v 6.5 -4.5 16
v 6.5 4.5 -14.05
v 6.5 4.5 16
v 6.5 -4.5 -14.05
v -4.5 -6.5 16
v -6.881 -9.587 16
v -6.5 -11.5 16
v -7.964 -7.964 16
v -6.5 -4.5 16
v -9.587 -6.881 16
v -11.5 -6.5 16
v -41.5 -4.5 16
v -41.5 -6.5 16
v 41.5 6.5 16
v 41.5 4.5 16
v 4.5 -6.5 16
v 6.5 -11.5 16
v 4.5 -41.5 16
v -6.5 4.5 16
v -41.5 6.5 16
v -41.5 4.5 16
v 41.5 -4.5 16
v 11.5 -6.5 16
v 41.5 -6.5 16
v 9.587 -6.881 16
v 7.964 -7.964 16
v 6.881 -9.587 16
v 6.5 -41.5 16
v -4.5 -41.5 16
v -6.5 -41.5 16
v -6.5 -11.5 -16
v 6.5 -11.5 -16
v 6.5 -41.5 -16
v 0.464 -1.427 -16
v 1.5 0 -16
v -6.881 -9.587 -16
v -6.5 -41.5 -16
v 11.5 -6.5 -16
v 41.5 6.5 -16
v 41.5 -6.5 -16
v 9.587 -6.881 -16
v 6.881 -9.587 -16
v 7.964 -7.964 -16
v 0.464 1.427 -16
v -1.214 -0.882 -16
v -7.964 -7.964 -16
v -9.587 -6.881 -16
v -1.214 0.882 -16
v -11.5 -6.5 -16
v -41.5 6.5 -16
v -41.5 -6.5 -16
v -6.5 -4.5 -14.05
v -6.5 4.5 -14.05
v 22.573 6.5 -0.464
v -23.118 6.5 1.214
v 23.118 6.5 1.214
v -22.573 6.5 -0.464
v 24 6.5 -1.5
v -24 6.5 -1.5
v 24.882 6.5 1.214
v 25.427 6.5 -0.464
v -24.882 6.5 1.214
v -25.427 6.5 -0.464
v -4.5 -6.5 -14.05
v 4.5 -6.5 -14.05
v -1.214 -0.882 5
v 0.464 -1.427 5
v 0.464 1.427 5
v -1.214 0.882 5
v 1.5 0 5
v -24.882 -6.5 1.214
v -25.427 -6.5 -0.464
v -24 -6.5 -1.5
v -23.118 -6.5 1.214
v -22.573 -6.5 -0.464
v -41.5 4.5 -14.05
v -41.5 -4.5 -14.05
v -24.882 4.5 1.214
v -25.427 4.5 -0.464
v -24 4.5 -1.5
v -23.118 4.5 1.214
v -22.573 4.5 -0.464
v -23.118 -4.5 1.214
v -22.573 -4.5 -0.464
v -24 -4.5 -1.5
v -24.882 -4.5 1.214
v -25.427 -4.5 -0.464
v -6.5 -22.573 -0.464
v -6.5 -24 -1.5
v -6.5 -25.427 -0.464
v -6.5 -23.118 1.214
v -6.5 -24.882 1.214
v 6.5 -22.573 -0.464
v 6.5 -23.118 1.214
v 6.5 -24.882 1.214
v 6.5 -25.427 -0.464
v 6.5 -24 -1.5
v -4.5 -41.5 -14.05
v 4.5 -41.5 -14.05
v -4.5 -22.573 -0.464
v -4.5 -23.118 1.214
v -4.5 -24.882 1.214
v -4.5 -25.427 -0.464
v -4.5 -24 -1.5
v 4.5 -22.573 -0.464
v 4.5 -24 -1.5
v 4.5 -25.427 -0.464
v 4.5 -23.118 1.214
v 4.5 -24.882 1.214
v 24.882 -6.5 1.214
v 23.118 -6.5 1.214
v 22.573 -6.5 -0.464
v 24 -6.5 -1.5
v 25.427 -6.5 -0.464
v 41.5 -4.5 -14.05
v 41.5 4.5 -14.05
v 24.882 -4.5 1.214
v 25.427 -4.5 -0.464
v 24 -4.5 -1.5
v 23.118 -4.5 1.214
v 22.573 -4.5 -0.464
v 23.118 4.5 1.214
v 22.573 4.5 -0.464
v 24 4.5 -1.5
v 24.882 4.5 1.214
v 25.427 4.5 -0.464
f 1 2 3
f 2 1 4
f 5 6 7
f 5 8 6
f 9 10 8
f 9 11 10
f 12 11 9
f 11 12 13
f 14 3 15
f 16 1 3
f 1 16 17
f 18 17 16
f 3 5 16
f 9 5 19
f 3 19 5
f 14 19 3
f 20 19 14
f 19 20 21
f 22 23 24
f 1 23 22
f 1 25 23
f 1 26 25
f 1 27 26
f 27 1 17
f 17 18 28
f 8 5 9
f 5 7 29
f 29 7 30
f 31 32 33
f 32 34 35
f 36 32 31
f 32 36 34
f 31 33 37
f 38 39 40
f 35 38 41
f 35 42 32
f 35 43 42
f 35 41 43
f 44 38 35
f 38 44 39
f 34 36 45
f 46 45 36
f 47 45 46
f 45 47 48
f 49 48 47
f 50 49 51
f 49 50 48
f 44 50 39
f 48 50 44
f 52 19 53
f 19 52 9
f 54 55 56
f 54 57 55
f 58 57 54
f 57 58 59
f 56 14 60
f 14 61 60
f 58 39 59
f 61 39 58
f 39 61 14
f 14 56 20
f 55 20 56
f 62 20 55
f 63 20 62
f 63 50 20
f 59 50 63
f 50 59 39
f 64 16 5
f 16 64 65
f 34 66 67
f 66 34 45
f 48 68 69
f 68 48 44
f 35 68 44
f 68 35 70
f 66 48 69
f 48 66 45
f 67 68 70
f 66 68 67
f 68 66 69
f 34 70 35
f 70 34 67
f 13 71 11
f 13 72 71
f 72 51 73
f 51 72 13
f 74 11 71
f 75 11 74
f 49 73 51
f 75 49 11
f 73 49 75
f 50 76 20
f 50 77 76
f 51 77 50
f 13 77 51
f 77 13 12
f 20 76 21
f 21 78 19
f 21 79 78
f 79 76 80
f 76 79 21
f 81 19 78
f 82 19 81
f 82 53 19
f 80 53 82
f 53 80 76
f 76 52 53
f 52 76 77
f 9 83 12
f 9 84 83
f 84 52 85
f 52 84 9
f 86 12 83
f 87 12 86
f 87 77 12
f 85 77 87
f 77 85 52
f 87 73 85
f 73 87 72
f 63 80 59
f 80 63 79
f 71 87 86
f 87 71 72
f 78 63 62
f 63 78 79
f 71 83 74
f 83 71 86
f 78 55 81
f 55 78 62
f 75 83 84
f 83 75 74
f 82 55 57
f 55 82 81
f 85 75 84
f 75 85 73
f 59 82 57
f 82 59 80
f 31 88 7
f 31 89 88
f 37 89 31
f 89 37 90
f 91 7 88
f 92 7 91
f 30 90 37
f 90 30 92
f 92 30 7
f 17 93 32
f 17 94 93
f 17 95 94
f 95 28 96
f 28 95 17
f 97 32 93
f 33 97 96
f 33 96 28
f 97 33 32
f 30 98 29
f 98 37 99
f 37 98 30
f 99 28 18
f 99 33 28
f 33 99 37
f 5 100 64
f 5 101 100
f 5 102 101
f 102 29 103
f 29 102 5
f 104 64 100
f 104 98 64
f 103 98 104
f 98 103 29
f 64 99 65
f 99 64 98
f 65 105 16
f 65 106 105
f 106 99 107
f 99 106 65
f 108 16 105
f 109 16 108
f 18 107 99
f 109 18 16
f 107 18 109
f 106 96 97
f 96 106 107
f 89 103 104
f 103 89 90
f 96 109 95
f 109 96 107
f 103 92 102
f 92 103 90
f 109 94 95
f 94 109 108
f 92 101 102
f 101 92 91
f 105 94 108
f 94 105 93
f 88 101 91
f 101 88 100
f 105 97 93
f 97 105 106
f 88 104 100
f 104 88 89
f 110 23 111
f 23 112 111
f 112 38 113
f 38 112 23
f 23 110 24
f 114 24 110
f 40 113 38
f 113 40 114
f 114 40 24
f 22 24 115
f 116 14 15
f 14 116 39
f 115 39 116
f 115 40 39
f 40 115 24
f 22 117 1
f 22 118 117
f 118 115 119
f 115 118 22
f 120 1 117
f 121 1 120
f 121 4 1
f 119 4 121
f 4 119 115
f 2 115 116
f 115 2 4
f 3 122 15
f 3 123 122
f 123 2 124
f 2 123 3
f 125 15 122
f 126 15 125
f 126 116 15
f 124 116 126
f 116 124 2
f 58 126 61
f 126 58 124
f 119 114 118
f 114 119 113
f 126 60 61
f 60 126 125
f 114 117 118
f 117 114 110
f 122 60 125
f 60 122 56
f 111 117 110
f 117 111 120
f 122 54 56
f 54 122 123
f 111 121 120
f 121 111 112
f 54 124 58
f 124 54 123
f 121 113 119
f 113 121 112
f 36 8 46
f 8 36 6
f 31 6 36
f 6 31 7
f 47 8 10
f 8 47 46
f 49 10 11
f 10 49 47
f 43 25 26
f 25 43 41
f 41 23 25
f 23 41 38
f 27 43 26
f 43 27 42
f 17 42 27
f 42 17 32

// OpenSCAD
/* [Basics] */
//how many boards do you want to connect? (default: 1-4; experimental)
connectors_amount = 3;
//angle between connectors..(default: 90; experimental)
connectors_angle = 90;
//enter the thickness of your boards (0 for shell only, which would then be double..)
board_thickness = 9;
//how long should the cutout for the board be?
notch_lenght = 35;
//depth of the cutout
notch_depth = 30;
//thickness of the walls
shell_thickness = 2;
//inner edges fillet (0 for none, default: 7; experimental)
edges_fillet = 7; //[0:10]
/* [Bottom Part] */
//false, if no foot is required
its_a_bottom_part = "false"; //[true, false]
//false, if the 1-connector-bottom-parts slot should face to the side
straight_1_connector_bottom = "false"; //[true, false]
//how thick should the foot be?
ground_offset = 16;
//what width should the foot have? (default: 30; experimental)
foot_width = 30; //[0:100]
ground_surface = ((notch_lenght + shell_thickness) * 2 + board_thickness)* foot_width / 100;
/* [Holes] */
//true, if there should be holes in the middle of the slotpartkindofthing
insert_hole_for_board = "true"; //[true, false]
//diameter of the hole
board_hole_size = 3;
//true, if there is shold be a hole for screws for some diagonal braces
insert_hole_for_brace = "true"; //[true, false]
//size of said holes
brace_hole_size = 3;
//depth of said holes
brace_hole_depth = 20; 
/* [Panels] */
//amount of back parts (default: 0-4, experimental)
back_parts_amount = 0; //[0:4]
//size of holes (default: 3)
back_part_hole_size = 3;
/* [Edge] */
// polynomial that goes through (1,1), (2,1), (3,2), (4,3) for number of spaces between rectangular notches
    //y(x) = pow(x, 2) / 2 - 3 * x / 2 + 2    
spaces = (pow(connectors_amount, 2) / 2) - (3 * connectors_amount / 2) + 2;

module centerpiece(){
        if((connectors_amount < 5) && (connectors_angle == 90)){
                cube([board_thickness + shell_thickness * 2, board_thickness + (shell_thickness*2), notch_depth + shell_thickness], center = true);}    
        else{
            cylinder(h = notch_depth + shell_thickness, r = board_thickness + shell_thickness, center = true);
        }
}

module brace_hole(){
    if (insert_hole_for_brace == "true"){
        difference(){
            centerpiece();
            translate([0, 0, - notch_depth / 2 - 1]) cylinder (h = brace_hole_depth + 1, r = brace_hole_size / 2, center = false, $fn=brace_hole_size + 2);
        }
    } else{
        centerpiece();
    }
}

module ground_piece(){
    if (its_a_bottom_part == "true" && connectors_amount < 4){
        translate([0, (ground_offset + board_thickness) / 2 + shell_thickness, 0])
        cube([ground_surface, ground_offset, notch_depth + shell_thickness], center = true);
    }
}
                    
module notch(){
    difference(){
        //centerpiece();
        translate([0, (notch_lenght + board_thickness) / 2 + shell_thickness, 0])
            cube([board_thickness + shell_thickness * 2, notch_lenght + shell_thickness*0, notch_depth + shell_thickness], center = true);
        translate([0, notch_lenght / 2 + board_thickness, shell_thickness / 2 + 1])
            cube([board_thickness, notch_lenght * 2, notch_depth + shell_thickness + 0.1], center = true);
    }
}


module board_hole(){
    if (insert_hole_for_board == "true"){
        difference(){
            notch();
            translate([0, (notch_lenght + board_thickness + 2 * shell_thickness) / 2, 0])
            rotate([0,90,0]) cylinder(h=board_thickness + 2 * shell_thickness + 0.1, r = board_hole_size / 2, center = true);}
}
else{
    notch();}
}

module rounded_corner(){
    difference(){
    translate([-(board_thickness + 2 * shell_thickness + notch_lenght / edges_fillet) / 2,-(board_thickness + 2 * shell_thickness + notch_lenght / edges_fillet) / 2, 0]) 
        cube([notch_lenght / edges_fillet, notch_lenght / edges_fillet, notch_depth+shell_thickness], center = true);
    translate([-(board_thickness + 2 * shell_thickness + 2* notch_lenght / edges_fillet)/2,-(board_thickness + 2 * shell_thickness + 2*notch_lenght / edges_fillet) / 2, 0])  
        cylinder(h = notch_depth+shell_thickness+0.1, r = notch_lenght/edges_fillet, center = true);;}
    
}

module main(){
    union(){
    brace_hole(); 
    for (i = [1 : connectors_amount]){
        rotate([0, 0, connectors_angle * i]) board_hole();}
    if (connectors_amount > 1 && connectors_amount < 8 && connectors_angle == 90){
        
        for (i = [1 : pow(2, connectors_amount - 2)]){
            rotate([0, 0, (i - 1) * connectors_angle]) rounded_corner();
        }
    }
    if (its_a_bottom_part == "true" && (connectors_amount == 1)){
        if (straight_1_connector_bottom == "false" && its_a_bottom_part == "true"){
        translate([(board_thickness + 2 * shell_thickness - ground_surface) / 2, 0, 0]) ground_piece();}    
        else{
            translate([(ground_offset + board_thickness) / 2 + shell_thickness, 0, 0]) cube([ground_offset, board_thickness + 2 * shell_thickness, notch_depth + shell_thickness], center = true);}
    }
    if (its_a_bottom_part && (connectors_amount == 2)){
    translate([(board_thickness + 2 * shell_thickness - ground_surface) / 2, 0, 0]) ground_piece();}
    if (its_a_bottom_part && (connectors_amount == 3)){
        ground_piece();}
    }
}

module add_back_notch(){
    if (back_parts_amount > 0){
        difference(){
            union(){
                main();
                for (i = [1 : back_parts_amount]){
                    rotate([0, 0, (i - 1) * connectors_angle])
                    translate([-(board_thickness + shell_thickness * 2 + notch_lenght) / 2, -(notch_lenght + board_thickness + 2 * shell_thickness) / 2,-(notch_depth - board_thickness - shell_thickness) / 2])
                    cube([notch_lenght, notch_lenght, board_thickness + 2 * shell_thickness], center = true);
                }
            }
            for (i = [1 : back_parts_amount]){
                rotate([0, 0, (i-1) * connectors_angle])
                translate([-(board_thickness + shell_thickness * 2 + notch_lenght) / 2 - 1, -(notch_lenght + board_thickness + 2 * shell_thickness) / 2-1,-(notch_depth - board_thickness - shell_thickness) / 2])
                cube([notch_lenght+2, notch_lenght+2, board_thickness], center = true);
                rotate([0, 0, (i-1) * connectors_angle])
                translate([-(board_thickness + shell_thickness * 2 + notch_lenght) / 2, -(notch_lenght + board_thickness + 2 * shell_thickness) / 2,-(notch_depth - board_thickness - shell_thickness) / 2])
                cylinder(h = board_thickness + 2 * shell_thickness + 0.1, r = back_part_hole_size / 2, center = true);
            }
            
        }
}else{
    main();
}
}
//    rotate([0, -90, 90]) translate([-(notch_depth - board_thickness - shell_thickness * 2 + shell_thickness) / 2, 0, (board_thickness + notch_depth + shell_thickness)/2+shell_thickness]) board_hole();


add_back_notch();

//TODO: center board hole
//TODO: 
